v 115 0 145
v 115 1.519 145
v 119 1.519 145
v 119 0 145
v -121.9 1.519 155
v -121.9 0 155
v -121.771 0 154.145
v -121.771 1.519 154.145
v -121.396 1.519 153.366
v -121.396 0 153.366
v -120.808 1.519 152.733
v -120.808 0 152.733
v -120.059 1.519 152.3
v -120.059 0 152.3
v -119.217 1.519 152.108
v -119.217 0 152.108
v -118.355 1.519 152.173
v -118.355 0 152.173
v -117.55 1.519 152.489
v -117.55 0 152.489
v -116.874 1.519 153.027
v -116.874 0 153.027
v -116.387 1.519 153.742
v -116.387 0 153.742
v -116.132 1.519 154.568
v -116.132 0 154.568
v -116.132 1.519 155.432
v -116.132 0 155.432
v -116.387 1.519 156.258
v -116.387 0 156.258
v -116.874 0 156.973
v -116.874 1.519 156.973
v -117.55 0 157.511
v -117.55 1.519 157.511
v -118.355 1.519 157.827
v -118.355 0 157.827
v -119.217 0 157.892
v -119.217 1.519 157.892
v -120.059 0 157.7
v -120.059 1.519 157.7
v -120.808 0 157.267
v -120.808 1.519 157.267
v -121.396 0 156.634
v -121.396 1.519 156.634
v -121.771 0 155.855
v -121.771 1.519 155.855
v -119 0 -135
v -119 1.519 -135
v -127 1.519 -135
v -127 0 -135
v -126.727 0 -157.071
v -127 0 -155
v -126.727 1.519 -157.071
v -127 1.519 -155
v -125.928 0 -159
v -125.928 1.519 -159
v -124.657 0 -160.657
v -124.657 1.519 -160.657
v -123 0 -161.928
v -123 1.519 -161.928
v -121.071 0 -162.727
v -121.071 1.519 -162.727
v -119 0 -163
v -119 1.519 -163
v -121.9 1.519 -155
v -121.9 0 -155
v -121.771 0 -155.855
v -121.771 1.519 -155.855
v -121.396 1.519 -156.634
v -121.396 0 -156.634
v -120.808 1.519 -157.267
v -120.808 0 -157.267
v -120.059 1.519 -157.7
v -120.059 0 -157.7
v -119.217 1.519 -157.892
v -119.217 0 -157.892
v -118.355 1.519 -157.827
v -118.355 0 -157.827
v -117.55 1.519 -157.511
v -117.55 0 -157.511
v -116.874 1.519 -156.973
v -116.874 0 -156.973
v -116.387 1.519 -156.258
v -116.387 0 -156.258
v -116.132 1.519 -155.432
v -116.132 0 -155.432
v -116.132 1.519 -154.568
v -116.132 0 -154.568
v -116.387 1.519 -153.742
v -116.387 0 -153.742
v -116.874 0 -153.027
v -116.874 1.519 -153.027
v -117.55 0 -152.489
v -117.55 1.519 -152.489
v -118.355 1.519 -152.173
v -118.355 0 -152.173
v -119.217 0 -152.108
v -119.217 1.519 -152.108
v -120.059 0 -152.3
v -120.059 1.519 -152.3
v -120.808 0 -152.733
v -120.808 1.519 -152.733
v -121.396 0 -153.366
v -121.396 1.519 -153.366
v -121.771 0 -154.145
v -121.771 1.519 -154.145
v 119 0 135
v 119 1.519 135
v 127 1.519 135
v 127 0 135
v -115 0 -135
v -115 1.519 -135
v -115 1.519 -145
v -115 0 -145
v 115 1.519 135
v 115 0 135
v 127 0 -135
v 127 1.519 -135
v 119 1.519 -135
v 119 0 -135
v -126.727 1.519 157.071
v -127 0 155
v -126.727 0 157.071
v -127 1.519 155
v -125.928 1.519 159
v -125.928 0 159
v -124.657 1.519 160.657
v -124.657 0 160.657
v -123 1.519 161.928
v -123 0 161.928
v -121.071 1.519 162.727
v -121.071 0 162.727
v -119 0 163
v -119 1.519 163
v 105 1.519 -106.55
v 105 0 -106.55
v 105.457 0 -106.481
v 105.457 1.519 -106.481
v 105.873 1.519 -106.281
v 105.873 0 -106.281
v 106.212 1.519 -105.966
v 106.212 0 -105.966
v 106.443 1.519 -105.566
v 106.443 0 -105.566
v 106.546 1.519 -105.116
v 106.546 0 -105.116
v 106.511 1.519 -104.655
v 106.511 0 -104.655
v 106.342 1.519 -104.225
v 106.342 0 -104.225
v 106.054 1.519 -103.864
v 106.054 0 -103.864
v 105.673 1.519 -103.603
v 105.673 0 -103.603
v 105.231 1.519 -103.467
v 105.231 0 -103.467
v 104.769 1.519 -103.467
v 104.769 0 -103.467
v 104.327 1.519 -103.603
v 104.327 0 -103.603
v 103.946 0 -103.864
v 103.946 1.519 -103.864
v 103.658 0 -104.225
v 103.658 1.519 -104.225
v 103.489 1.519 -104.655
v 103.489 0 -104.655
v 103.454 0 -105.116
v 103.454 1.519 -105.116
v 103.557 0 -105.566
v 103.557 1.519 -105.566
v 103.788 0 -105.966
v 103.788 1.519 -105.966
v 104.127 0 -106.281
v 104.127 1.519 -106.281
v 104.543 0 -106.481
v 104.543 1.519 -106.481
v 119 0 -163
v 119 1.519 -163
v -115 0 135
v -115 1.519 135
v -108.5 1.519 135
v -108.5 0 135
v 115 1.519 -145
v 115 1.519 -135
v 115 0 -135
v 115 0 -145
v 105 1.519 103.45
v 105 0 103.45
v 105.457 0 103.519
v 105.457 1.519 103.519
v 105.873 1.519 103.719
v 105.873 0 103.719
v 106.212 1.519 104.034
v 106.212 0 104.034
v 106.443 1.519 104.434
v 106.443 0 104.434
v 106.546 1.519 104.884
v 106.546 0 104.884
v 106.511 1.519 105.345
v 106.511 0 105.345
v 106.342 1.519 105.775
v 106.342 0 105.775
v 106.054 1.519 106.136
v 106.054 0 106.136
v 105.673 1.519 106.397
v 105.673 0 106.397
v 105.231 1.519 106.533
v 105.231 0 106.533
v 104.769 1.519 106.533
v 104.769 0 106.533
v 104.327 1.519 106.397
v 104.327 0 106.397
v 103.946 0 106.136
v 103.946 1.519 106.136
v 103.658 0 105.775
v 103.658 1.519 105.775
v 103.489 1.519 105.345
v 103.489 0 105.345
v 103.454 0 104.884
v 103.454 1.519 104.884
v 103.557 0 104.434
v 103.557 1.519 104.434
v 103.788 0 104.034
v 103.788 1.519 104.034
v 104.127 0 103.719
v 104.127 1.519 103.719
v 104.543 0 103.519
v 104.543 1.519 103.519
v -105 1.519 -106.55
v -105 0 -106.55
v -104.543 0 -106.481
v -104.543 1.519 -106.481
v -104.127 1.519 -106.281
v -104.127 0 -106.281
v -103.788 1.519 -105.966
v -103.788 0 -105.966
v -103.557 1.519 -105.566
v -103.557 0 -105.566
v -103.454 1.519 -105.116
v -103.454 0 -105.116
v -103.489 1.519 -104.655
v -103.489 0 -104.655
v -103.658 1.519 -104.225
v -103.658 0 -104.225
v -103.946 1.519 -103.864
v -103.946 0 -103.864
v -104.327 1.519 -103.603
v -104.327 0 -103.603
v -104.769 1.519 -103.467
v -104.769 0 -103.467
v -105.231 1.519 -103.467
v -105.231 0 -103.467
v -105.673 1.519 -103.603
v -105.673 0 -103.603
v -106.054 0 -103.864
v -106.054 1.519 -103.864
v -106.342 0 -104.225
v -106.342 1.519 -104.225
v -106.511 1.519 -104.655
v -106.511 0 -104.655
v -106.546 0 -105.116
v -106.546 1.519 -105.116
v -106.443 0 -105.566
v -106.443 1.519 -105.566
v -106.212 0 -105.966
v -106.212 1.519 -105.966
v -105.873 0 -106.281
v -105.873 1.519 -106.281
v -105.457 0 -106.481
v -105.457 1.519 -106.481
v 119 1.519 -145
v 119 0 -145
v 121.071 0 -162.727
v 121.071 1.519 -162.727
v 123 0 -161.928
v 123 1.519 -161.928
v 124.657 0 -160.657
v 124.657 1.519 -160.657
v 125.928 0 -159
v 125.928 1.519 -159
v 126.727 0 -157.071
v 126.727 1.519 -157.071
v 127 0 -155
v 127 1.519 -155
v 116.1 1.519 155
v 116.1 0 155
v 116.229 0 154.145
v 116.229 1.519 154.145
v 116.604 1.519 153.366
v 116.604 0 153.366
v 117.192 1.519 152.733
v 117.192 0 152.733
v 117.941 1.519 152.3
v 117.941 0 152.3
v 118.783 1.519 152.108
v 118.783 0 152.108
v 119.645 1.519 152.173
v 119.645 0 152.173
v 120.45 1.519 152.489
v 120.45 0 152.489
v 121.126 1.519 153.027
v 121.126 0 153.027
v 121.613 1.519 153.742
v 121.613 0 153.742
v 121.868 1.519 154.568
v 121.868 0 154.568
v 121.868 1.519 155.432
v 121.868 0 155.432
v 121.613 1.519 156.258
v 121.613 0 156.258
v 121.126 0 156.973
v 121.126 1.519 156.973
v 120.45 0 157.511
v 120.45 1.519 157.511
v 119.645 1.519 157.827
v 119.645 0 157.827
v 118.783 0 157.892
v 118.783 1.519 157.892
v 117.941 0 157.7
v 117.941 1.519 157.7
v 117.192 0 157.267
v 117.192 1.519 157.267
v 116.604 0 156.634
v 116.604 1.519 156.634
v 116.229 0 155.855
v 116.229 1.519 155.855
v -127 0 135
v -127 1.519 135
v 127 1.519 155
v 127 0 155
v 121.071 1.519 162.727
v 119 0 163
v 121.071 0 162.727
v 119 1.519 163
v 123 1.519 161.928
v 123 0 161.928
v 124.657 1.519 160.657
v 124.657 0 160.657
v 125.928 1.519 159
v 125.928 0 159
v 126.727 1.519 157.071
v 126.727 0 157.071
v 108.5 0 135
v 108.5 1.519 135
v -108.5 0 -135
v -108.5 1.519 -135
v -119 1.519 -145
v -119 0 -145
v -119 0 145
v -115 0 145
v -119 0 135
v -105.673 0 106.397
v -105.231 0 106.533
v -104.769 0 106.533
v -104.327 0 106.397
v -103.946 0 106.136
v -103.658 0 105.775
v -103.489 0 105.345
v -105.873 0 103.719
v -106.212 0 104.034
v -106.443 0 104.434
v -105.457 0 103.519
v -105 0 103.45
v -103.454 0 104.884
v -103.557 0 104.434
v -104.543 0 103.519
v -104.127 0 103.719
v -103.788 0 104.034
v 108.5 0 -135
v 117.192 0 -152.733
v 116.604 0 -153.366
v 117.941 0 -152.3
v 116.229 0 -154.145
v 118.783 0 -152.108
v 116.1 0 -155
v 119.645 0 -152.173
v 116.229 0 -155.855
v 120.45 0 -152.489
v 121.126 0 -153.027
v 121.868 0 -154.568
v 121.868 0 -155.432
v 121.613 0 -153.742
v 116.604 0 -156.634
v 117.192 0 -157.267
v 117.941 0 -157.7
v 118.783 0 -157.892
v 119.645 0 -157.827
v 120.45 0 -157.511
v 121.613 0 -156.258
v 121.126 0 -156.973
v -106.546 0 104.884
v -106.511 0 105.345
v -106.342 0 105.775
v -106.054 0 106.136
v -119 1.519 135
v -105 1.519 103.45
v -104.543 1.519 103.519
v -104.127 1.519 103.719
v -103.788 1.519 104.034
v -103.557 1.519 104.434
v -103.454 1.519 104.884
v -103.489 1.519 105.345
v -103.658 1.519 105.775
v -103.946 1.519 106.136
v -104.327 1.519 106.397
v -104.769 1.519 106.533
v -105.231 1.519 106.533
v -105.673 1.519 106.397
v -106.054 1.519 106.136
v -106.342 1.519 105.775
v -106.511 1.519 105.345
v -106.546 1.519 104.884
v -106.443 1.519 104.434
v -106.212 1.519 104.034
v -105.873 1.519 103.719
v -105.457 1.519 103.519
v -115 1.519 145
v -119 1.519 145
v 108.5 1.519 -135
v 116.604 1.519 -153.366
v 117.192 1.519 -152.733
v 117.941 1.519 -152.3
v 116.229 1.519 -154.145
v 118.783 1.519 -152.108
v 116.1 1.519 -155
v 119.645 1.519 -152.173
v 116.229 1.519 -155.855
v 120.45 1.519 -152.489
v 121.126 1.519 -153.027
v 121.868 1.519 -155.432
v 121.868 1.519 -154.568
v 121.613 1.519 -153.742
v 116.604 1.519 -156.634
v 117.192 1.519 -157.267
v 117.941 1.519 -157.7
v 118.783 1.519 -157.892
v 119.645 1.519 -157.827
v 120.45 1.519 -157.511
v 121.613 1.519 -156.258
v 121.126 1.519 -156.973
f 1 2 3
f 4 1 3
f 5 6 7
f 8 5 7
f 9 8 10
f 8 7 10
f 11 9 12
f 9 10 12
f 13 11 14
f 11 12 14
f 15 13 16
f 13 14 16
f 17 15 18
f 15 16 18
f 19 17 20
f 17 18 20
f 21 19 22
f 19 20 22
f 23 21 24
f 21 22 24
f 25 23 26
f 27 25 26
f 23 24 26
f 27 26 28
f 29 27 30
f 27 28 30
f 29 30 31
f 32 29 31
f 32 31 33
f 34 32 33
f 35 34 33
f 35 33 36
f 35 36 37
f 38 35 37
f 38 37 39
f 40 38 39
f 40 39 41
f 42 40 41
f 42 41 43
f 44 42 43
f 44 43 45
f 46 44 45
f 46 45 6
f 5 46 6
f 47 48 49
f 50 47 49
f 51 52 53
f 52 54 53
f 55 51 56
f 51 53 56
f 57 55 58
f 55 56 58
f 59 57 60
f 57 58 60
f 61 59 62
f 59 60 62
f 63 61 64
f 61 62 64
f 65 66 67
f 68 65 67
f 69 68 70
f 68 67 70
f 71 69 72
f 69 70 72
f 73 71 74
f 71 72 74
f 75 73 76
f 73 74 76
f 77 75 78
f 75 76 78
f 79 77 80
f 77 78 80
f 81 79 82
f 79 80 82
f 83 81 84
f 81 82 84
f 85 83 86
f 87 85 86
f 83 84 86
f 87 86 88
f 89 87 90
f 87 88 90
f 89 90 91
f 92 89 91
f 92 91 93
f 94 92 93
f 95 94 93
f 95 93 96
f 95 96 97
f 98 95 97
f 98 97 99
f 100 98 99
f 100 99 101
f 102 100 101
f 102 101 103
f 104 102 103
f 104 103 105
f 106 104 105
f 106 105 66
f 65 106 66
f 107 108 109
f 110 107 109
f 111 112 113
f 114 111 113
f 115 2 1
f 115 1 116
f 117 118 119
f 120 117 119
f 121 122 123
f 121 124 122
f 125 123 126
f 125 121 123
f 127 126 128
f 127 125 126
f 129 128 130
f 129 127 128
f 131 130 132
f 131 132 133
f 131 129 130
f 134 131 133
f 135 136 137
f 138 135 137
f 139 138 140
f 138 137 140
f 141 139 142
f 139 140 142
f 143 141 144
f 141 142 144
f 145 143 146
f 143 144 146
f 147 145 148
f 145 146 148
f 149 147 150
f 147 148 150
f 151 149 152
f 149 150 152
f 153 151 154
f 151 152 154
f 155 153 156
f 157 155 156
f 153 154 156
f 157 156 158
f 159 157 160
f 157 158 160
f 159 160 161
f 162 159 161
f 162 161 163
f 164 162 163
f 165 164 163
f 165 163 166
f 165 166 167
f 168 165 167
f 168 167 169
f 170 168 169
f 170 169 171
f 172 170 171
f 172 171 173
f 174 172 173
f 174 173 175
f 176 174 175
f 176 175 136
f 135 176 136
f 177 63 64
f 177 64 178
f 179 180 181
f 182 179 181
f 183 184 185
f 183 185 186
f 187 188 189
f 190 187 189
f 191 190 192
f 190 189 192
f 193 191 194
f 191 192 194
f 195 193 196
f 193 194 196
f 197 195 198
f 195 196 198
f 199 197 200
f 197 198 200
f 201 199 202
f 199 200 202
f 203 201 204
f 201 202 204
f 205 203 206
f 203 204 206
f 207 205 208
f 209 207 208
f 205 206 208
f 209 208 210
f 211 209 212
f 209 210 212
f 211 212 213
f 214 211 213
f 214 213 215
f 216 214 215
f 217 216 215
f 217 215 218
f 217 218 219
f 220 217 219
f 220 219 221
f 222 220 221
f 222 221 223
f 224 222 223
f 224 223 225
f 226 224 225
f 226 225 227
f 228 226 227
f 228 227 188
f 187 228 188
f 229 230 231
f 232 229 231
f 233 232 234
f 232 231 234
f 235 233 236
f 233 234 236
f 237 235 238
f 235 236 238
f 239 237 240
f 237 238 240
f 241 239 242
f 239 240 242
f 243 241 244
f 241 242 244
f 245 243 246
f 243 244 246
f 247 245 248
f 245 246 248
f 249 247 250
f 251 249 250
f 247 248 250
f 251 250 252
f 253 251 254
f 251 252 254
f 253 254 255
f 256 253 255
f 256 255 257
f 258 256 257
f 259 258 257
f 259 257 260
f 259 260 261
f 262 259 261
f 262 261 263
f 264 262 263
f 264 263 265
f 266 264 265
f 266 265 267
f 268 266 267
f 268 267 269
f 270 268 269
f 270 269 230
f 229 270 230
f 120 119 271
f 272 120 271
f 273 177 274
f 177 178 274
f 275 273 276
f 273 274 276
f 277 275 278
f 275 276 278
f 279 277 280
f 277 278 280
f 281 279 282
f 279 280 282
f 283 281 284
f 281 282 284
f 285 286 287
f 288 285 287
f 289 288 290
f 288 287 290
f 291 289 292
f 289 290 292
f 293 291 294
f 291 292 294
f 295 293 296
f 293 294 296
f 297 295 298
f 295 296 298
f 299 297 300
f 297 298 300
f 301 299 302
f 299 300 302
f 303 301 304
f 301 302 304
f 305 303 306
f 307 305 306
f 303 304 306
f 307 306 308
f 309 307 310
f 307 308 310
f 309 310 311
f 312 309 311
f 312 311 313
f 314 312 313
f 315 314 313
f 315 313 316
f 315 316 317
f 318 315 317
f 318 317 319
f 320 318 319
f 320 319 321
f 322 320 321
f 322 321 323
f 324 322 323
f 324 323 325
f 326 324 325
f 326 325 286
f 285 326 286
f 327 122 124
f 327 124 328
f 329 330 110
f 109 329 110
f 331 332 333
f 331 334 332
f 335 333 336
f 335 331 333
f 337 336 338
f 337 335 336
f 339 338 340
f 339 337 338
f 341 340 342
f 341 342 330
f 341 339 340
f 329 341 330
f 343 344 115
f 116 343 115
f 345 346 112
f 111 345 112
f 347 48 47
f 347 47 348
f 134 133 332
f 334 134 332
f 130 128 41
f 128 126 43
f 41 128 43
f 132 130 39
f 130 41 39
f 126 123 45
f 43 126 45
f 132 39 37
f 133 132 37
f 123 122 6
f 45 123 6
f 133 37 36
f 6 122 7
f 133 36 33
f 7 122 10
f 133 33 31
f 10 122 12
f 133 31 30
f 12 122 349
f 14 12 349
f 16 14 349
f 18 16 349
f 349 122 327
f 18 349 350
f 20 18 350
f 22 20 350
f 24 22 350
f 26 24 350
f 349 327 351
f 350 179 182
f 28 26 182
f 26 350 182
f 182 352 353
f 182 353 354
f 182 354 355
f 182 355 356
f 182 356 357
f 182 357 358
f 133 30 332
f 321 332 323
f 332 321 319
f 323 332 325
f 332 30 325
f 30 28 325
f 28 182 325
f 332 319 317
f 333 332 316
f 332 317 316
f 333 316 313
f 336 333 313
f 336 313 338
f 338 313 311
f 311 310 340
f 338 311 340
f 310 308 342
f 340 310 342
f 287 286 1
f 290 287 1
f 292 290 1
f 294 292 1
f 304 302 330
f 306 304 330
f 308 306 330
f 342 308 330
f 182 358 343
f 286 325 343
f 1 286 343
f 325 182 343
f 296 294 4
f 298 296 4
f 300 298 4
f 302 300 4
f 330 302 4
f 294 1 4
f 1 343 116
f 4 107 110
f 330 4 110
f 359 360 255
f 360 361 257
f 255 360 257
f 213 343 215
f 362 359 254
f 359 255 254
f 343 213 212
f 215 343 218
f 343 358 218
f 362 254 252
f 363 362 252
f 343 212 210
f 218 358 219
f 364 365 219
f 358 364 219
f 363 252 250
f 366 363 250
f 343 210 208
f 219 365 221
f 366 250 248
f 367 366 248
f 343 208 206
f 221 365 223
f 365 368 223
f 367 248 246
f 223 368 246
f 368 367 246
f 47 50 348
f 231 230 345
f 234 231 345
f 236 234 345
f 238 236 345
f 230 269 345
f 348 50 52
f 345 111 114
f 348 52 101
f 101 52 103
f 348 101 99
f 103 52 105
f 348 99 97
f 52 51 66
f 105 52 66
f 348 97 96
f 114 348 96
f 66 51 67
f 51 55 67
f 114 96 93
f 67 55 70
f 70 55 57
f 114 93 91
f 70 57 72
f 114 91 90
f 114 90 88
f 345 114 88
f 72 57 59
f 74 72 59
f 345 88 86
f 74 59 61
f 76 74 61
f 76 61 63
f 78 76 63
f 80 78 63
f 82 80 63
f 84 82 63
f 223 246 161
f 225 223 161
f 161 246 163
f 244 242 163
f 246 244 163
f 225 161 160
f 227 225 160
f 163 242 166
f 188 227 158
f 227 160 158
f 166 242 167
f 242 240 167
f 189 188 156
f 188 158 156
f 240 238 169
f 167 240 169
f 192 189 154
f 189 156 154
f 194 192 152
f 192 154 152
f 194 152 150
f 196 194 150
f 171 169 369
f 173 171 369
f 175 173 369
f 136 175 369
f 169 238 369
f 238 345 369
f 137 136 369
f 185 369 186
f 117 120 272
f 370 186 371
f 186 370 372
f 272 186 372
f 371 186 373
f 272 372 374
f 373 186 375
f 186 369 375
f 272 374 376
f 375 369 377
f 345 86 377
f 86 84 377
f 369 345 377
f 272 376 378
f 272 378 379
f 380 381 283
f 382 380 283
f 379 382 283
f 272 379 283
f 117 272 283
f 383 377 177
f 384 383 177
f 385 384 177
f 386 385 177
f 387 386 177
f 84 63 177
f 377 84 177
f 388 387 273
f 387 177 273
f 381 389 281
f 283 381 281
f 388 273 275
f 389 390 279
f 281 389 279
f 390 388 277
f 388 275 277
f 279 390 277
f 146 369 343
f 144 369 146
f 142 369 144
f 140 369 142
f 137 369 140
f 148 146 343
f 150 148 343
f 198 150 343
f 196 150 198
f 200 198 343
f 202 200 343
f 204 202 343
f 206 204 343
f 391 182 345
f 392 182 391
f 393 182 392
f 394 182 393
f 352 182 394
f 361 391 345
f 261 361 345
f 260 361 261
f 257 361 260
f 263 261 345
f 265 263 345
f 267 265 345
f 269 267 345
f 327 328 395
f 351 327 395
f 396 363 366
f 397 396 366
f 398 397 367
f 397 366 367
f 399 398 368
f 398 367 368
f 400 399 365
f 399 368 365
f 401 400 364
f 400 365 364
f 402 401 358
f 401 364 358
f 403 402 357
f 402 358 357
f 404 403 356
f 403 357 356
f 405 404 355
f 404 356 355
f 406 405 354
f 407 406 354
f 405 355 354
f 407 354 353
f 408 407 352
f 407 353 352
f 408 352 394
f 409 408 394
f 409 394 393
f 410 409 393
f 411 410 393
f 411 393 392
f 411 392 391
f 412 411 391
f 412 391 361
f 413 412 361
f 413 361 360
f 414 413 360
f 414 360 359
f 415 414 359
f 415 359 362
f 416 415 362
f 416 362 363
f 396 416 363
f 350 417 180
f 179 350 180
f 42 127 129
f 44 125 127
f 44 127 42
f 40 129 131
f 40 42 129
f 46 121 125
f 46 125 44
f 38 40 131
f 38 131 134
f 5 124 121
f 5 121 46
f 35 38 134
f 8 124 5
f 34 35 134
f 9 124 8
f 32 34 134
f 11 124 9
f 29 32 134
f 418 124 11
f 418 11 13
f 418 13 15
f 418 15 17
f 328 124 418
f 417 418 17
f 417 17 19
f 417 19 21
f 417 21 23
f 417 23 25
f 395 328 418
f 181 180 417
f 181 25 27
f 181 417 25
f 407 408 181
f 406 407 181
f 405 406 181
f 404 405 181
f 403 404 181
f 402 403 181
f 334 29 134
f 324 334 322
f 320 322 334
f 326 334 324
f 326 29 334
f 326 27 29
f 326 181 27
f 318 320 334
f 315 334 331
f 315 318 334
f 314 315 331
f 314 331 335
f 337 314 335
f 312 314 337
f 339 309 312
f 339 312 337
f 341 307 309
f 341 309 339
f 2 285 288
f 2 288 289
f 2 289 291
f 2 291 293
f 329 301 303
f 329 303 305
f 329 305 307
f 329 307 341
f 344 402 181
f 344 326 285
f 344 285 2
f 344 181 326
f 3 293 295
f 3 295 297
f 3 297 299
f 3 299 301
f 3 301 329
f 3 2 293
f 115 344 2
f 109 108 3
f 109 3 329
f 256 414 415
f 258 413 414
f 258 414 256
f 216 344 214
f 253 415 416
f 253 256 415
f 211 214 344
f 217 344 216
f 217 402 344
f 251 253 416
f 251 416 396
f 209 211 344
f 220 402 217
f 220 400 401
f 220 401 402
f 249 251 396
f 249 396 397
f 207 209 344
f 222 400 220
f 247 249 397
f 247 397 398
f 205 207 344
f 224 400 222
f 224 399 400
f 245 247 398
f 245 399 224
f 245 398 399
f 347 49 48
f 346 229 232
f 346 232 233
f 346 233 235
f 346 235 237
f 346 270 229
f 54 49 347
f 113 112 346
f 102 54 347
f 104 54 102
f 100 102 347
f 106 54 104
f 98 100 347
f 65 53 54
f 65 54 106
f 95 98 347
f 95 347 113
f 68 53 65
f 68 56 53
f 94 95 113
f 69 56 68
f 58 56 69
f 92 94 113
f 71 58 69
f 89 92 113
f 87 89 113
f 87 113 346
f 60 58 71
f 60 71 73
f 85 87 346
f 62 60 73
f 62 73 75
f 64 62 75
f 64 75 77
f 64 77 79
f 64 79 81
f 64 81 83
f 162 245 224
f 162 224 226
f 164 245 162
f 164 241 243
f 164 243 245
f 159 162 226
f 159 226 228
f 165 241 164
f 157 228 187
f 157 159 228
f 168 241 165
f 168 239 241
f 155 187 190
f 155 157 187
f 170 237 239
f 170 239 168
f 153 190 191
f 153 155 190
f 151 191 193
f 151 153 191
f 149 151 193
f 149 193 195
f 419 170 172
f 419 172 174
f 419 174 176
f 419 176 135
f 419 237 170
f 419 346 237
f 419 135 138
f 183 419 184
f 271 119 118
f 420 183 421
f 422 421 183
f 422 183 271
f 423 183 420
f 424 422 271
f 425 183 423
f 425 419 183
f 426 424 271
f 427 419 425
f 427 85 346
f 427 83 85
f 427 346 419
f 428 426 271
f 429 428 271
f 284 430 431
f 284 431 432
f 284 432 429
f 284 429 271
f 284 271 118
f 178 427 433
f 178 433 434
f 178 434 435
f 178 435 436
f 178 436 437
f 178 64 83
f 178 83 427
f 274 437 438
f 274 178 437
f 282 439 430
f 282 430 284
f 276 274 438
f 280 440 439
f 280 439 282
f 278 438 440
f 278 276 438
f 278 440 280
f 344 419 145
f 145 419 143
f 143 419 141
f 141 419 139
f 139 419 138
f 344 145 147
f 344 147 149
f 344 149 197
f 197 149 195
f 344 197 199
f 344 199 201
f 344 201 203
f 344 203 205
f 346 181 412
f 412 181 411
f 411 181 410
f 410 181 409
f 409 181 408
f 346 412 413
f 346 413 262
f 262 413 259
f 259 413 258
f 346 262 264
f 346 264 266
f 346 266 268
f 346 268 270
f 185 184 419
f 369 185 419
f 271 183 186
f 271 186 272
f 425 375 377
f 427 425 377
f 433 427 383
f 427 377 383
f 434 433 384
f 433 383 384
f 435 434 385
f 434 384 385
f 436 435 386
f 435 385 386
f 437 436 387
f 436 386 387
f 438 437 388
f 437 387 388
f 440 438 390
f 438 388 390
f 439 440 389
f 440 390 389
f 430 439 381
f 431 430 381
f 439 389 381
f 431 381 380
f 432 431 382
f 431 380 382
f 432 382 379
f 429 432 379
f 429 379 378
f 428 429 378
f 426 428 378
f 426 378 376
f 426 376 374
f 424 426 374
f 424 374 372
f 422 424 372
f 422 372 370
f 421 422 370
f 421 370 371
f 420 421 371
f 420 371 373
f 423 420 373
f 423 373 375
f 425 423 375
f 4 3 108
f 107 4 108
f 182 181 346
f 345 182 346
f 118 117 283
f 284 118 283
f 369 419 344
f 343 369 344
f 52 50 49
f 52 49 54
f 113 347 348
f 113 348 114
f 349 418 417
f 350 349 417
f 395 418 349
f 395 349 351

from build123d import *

# Parameters (mm, degrees)
SKETCH1_W                  = 254
SKETCH1_H                  = 326
BOSS_EXTRUDE1_DEPTH        = 1.51892
M2_5_CLEARANCE_HOLE1_D     = 3.1
M2_5_CLEARANCE_HOLE1_DEPTH = 11.938
M2_5_CLEARANCE_HOLE1_TIP   = 0.931333959
M5_CLEARANCE_HOLE1_D       = 5.8
M5_CLEARANCE_HOLE1_DEPTH   = 11.938
M5_CLEARANCE_HOLE1_TIP     = 1.742495795
FILLET1_R                  = 8
SKETCH6_W                  = 4
SKETCH6_H                  = 10
CUT_EXTRUDE1_DEPTH         = 10


with BuildPart() as part:
    # Sketch1 → Boss-Extrude1 (new body)
    with BuildSketch(Plane(origin=(0, 0, 0), x_dir=(1, 0, 0), z_dir=(0, 1, 0))):
        Rectangle(SKETCH1_W, SKETCH1_H)
    extrude(amount=BOSS_EXTRUDE1_DEPTH)

    # M2.5 Clearance Hole1
    with Locations(Plane(origin=(-105, 1.51892, 105), x_dir=(0, 0, 1), z_dir=(0, 1, 0))):
        with Locations((0, 0), (-210, 0), (-210, 210), (0, 210)):
            Hole(M2_5_CLEARANCE_HOLE1_D / 2, depth=M2_5_CLEARANCE_HOLE1_DEPTH)
            with Locations((0, 0, -(M2_5_CLEARANCE_HOLE1_DEPTH + M2_5_CLEARANCE_HOLE1_TIP / 2))):  # 118° drill point
                Cone(0, M2_5_CLEARANCE_HOLE1_D / 2, M2_5_CLEARANCE_HOLE1_TIP, mode=Mode.SUBTRACT)

    # M5 Clearance Hole1
    with Locations(Plane(origin=(0, 1.51892, 0), x_dir=(1, 0, 0), z_dir=(0, 1, 0))):
        with Locations((-119, 155), (119, 155), (119, -155), (-119, -155)):
            Hole(M5_CLEARANCE_HOLE1_D / 2, depth=M5_CLEARANCE_HOLE1_DEPTH)
            with Locations((0, 0, -(M5_CLEARANCE_HOLE1_DEPTH + M5_CLEARANCE_HOLE1_TIP / 2))):  # 118° drill point
                Cone(0, M5_CLEARANCE_HOLE1_D / 2, M5_CLEARANCE_HOLE1_TIP, mode=Mode.SUBTRACT)

    # Fillet1
    fillet1_edges = [part.edges().sort_by_distance(p)[0] for p in [
        (-127, 0.75946, -163),
        (127, 0.75946, -163),
        (127, 0.75946, 163),
        (-127, 0.75946, 163),
    ]]
    fillet(fillet1_edges, radius=FILLET1_R)

    # Sketch6 → Cut-Extrude1 (cut)
    with BuildSketch(Plane(origin=(0, 1.51892, 0), x_dir=(1, 0, 0), z_dir=(0, 1, 0))):
        Polygon((127, -135), (127, 135), (119, 135), (115, 135), (108.5, 135), (108.5, -135), (115, -135), (119, -135), align=None)
        with Locations((117, -140)):
            Rectangle(SKETCH6_W, SKETCH6_H)
        with Locations((117, 140)):
            Rectangle(SKETCH6_W, SKETCH6_H)
        Polygon((-119, -135), (-115, -135), (-108.5, -135), (-108.5, 135), (-115, 135), (-119, 135), (-127, 135), (-127, -135), align=None)
        with Locations((-117, -140)):
            Rectangle(SKETCH6_W, SKETCH6_H)
        with Locations((-117, 140)):
            Rectangle(SKETCH6_W, SKETCH6_H)
    extrude(amount=-CUT_EXTRUDE1_DEPTH, mode=Mode.SUBTRACT)


solid = part.part
